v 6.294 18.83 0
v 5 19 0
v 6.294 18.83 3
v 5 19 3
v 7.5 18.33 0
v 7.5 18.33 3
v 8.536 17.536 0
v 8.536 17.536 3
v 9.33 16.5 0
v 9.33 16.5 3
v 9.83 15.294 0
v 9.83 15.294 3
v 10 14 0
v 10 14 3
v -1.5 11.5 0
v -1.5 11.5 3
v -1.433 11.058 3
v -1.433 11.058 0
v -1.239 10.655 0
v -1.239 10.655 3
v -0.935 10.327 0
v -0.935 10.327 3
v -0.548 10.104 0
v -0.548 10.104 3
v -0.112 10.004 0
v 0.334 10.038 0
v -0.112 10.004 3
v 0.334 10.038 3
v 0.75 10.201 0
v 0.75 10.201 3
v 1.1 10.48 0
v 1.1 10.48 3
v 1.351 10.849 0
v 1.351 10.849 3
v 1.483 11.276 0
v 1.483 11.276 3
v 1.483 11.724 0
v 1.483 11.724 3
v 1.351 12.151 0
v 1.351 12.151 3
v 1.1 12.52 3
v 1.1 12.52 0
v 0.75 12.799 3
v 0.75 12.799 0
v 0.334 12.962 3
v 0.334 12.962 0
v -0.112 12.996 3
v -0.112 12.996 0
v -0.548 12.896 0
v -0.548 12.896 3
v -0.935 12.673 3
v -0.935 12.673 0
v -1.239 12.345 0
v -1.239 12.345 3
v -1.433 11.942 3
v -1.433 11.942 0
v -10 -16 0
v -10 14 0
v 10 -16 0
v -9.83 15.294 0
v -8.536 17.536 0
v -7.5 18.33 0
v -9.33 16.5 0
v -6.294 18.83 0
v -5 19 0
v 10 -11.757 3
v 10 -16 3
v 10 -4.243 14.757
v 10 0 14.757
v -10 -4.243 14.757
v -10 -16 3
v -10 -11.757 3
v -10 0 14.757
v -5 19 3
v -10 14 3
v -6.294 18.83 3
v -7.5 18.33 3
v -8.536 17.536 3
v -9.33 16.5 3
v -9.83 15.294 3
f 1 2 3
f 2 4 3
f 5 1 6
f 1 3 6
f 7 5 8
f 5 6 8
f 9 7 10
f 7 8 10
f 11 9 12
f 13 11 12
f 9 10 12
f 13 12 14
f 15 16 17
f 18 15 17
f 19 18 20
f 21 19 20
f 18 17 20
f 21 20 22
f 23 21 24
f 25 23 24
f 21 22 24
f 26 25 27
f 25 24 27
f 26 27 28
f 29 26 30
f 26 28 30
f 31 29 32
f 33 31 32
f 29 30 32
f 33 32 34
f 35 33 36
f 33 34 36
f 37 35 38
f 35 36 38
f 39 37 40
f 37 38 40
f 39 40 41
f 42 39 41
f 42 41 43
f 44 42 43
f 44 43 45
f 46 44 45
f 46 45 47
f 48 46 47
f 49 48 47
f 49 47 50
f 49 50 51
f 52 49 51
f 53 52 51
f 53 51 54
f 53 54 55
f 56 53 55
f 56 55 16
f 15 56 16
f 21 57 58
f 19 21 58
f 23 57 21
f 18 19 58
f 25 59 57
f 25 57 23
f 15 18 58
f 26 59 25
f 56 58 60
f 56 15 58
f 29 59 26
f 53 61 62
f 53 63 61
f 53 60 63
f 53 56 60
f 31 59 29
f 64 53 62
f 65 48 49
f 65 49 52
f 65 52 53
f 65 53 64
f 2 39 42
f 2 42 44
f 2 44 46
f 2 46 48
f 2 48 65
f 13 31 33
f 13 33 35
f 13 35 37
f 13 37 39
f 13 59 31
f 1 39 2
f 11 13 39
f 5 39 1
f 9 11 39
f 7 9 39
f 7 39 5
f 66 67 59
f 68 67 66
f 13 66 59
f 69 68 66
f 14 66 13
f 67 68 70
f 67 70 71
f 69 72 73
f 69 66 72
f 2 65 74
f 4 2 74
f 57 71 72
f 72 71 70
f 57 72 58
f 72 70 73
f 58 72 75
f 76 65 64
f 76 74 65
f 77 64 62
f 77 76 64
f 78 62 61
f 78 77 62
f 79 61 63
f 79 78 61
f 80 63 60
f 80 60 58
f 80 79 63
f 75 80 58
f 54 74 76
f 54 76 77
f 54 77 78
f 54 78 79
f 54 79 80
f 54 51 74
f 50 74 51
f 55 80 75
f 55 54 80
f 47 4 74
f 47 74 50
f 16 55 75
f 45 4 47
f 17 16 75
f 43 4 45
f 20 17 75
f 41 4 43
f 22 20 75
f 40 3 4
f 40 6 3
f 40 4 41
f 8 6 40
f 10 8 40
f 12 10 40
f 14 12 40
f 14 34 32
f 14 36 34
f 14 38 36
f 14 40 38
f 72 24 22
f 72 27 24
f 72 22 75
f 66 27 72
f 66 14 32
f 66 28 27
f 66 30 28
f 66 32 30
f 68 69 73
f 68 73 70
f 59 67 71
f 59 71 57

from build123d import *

# Parameters (mm, degrees)
F1_DEPTH = 10
F2_R     = 5
F4_D     = 3


with BuildPart() as f1:
    # F0 (on Right) → F1 (new body, symmetric)
    with BuildSketch(Plane.YZ):
        Polygon((-11.7573593129, 3), (0, 14.7573593129), (-4.2426406871, 14.7573593129), (-16, 3), (-16, 0), (19, 0), (19, 3), align=None)
    extrude(amount=F1_DEPTH, both=True)

    # F2
    f2_edges = [f1.edges().sort_by_distance(p)[0] for p in [
        (10, 19, 1.5),
        (-10, 19, 1.5),
    ]]
    fillet(f2_edges, radius=F2_R)

    # F4 (through all)
    with Locations(Plane(origin=(0, 0, 0), x_dir=(1, 0, 0), z_dir=(0, 0, -1))):
        with Locations((0, -11.5)):
            Hole(F4_D / 2)


solid = f1.part
